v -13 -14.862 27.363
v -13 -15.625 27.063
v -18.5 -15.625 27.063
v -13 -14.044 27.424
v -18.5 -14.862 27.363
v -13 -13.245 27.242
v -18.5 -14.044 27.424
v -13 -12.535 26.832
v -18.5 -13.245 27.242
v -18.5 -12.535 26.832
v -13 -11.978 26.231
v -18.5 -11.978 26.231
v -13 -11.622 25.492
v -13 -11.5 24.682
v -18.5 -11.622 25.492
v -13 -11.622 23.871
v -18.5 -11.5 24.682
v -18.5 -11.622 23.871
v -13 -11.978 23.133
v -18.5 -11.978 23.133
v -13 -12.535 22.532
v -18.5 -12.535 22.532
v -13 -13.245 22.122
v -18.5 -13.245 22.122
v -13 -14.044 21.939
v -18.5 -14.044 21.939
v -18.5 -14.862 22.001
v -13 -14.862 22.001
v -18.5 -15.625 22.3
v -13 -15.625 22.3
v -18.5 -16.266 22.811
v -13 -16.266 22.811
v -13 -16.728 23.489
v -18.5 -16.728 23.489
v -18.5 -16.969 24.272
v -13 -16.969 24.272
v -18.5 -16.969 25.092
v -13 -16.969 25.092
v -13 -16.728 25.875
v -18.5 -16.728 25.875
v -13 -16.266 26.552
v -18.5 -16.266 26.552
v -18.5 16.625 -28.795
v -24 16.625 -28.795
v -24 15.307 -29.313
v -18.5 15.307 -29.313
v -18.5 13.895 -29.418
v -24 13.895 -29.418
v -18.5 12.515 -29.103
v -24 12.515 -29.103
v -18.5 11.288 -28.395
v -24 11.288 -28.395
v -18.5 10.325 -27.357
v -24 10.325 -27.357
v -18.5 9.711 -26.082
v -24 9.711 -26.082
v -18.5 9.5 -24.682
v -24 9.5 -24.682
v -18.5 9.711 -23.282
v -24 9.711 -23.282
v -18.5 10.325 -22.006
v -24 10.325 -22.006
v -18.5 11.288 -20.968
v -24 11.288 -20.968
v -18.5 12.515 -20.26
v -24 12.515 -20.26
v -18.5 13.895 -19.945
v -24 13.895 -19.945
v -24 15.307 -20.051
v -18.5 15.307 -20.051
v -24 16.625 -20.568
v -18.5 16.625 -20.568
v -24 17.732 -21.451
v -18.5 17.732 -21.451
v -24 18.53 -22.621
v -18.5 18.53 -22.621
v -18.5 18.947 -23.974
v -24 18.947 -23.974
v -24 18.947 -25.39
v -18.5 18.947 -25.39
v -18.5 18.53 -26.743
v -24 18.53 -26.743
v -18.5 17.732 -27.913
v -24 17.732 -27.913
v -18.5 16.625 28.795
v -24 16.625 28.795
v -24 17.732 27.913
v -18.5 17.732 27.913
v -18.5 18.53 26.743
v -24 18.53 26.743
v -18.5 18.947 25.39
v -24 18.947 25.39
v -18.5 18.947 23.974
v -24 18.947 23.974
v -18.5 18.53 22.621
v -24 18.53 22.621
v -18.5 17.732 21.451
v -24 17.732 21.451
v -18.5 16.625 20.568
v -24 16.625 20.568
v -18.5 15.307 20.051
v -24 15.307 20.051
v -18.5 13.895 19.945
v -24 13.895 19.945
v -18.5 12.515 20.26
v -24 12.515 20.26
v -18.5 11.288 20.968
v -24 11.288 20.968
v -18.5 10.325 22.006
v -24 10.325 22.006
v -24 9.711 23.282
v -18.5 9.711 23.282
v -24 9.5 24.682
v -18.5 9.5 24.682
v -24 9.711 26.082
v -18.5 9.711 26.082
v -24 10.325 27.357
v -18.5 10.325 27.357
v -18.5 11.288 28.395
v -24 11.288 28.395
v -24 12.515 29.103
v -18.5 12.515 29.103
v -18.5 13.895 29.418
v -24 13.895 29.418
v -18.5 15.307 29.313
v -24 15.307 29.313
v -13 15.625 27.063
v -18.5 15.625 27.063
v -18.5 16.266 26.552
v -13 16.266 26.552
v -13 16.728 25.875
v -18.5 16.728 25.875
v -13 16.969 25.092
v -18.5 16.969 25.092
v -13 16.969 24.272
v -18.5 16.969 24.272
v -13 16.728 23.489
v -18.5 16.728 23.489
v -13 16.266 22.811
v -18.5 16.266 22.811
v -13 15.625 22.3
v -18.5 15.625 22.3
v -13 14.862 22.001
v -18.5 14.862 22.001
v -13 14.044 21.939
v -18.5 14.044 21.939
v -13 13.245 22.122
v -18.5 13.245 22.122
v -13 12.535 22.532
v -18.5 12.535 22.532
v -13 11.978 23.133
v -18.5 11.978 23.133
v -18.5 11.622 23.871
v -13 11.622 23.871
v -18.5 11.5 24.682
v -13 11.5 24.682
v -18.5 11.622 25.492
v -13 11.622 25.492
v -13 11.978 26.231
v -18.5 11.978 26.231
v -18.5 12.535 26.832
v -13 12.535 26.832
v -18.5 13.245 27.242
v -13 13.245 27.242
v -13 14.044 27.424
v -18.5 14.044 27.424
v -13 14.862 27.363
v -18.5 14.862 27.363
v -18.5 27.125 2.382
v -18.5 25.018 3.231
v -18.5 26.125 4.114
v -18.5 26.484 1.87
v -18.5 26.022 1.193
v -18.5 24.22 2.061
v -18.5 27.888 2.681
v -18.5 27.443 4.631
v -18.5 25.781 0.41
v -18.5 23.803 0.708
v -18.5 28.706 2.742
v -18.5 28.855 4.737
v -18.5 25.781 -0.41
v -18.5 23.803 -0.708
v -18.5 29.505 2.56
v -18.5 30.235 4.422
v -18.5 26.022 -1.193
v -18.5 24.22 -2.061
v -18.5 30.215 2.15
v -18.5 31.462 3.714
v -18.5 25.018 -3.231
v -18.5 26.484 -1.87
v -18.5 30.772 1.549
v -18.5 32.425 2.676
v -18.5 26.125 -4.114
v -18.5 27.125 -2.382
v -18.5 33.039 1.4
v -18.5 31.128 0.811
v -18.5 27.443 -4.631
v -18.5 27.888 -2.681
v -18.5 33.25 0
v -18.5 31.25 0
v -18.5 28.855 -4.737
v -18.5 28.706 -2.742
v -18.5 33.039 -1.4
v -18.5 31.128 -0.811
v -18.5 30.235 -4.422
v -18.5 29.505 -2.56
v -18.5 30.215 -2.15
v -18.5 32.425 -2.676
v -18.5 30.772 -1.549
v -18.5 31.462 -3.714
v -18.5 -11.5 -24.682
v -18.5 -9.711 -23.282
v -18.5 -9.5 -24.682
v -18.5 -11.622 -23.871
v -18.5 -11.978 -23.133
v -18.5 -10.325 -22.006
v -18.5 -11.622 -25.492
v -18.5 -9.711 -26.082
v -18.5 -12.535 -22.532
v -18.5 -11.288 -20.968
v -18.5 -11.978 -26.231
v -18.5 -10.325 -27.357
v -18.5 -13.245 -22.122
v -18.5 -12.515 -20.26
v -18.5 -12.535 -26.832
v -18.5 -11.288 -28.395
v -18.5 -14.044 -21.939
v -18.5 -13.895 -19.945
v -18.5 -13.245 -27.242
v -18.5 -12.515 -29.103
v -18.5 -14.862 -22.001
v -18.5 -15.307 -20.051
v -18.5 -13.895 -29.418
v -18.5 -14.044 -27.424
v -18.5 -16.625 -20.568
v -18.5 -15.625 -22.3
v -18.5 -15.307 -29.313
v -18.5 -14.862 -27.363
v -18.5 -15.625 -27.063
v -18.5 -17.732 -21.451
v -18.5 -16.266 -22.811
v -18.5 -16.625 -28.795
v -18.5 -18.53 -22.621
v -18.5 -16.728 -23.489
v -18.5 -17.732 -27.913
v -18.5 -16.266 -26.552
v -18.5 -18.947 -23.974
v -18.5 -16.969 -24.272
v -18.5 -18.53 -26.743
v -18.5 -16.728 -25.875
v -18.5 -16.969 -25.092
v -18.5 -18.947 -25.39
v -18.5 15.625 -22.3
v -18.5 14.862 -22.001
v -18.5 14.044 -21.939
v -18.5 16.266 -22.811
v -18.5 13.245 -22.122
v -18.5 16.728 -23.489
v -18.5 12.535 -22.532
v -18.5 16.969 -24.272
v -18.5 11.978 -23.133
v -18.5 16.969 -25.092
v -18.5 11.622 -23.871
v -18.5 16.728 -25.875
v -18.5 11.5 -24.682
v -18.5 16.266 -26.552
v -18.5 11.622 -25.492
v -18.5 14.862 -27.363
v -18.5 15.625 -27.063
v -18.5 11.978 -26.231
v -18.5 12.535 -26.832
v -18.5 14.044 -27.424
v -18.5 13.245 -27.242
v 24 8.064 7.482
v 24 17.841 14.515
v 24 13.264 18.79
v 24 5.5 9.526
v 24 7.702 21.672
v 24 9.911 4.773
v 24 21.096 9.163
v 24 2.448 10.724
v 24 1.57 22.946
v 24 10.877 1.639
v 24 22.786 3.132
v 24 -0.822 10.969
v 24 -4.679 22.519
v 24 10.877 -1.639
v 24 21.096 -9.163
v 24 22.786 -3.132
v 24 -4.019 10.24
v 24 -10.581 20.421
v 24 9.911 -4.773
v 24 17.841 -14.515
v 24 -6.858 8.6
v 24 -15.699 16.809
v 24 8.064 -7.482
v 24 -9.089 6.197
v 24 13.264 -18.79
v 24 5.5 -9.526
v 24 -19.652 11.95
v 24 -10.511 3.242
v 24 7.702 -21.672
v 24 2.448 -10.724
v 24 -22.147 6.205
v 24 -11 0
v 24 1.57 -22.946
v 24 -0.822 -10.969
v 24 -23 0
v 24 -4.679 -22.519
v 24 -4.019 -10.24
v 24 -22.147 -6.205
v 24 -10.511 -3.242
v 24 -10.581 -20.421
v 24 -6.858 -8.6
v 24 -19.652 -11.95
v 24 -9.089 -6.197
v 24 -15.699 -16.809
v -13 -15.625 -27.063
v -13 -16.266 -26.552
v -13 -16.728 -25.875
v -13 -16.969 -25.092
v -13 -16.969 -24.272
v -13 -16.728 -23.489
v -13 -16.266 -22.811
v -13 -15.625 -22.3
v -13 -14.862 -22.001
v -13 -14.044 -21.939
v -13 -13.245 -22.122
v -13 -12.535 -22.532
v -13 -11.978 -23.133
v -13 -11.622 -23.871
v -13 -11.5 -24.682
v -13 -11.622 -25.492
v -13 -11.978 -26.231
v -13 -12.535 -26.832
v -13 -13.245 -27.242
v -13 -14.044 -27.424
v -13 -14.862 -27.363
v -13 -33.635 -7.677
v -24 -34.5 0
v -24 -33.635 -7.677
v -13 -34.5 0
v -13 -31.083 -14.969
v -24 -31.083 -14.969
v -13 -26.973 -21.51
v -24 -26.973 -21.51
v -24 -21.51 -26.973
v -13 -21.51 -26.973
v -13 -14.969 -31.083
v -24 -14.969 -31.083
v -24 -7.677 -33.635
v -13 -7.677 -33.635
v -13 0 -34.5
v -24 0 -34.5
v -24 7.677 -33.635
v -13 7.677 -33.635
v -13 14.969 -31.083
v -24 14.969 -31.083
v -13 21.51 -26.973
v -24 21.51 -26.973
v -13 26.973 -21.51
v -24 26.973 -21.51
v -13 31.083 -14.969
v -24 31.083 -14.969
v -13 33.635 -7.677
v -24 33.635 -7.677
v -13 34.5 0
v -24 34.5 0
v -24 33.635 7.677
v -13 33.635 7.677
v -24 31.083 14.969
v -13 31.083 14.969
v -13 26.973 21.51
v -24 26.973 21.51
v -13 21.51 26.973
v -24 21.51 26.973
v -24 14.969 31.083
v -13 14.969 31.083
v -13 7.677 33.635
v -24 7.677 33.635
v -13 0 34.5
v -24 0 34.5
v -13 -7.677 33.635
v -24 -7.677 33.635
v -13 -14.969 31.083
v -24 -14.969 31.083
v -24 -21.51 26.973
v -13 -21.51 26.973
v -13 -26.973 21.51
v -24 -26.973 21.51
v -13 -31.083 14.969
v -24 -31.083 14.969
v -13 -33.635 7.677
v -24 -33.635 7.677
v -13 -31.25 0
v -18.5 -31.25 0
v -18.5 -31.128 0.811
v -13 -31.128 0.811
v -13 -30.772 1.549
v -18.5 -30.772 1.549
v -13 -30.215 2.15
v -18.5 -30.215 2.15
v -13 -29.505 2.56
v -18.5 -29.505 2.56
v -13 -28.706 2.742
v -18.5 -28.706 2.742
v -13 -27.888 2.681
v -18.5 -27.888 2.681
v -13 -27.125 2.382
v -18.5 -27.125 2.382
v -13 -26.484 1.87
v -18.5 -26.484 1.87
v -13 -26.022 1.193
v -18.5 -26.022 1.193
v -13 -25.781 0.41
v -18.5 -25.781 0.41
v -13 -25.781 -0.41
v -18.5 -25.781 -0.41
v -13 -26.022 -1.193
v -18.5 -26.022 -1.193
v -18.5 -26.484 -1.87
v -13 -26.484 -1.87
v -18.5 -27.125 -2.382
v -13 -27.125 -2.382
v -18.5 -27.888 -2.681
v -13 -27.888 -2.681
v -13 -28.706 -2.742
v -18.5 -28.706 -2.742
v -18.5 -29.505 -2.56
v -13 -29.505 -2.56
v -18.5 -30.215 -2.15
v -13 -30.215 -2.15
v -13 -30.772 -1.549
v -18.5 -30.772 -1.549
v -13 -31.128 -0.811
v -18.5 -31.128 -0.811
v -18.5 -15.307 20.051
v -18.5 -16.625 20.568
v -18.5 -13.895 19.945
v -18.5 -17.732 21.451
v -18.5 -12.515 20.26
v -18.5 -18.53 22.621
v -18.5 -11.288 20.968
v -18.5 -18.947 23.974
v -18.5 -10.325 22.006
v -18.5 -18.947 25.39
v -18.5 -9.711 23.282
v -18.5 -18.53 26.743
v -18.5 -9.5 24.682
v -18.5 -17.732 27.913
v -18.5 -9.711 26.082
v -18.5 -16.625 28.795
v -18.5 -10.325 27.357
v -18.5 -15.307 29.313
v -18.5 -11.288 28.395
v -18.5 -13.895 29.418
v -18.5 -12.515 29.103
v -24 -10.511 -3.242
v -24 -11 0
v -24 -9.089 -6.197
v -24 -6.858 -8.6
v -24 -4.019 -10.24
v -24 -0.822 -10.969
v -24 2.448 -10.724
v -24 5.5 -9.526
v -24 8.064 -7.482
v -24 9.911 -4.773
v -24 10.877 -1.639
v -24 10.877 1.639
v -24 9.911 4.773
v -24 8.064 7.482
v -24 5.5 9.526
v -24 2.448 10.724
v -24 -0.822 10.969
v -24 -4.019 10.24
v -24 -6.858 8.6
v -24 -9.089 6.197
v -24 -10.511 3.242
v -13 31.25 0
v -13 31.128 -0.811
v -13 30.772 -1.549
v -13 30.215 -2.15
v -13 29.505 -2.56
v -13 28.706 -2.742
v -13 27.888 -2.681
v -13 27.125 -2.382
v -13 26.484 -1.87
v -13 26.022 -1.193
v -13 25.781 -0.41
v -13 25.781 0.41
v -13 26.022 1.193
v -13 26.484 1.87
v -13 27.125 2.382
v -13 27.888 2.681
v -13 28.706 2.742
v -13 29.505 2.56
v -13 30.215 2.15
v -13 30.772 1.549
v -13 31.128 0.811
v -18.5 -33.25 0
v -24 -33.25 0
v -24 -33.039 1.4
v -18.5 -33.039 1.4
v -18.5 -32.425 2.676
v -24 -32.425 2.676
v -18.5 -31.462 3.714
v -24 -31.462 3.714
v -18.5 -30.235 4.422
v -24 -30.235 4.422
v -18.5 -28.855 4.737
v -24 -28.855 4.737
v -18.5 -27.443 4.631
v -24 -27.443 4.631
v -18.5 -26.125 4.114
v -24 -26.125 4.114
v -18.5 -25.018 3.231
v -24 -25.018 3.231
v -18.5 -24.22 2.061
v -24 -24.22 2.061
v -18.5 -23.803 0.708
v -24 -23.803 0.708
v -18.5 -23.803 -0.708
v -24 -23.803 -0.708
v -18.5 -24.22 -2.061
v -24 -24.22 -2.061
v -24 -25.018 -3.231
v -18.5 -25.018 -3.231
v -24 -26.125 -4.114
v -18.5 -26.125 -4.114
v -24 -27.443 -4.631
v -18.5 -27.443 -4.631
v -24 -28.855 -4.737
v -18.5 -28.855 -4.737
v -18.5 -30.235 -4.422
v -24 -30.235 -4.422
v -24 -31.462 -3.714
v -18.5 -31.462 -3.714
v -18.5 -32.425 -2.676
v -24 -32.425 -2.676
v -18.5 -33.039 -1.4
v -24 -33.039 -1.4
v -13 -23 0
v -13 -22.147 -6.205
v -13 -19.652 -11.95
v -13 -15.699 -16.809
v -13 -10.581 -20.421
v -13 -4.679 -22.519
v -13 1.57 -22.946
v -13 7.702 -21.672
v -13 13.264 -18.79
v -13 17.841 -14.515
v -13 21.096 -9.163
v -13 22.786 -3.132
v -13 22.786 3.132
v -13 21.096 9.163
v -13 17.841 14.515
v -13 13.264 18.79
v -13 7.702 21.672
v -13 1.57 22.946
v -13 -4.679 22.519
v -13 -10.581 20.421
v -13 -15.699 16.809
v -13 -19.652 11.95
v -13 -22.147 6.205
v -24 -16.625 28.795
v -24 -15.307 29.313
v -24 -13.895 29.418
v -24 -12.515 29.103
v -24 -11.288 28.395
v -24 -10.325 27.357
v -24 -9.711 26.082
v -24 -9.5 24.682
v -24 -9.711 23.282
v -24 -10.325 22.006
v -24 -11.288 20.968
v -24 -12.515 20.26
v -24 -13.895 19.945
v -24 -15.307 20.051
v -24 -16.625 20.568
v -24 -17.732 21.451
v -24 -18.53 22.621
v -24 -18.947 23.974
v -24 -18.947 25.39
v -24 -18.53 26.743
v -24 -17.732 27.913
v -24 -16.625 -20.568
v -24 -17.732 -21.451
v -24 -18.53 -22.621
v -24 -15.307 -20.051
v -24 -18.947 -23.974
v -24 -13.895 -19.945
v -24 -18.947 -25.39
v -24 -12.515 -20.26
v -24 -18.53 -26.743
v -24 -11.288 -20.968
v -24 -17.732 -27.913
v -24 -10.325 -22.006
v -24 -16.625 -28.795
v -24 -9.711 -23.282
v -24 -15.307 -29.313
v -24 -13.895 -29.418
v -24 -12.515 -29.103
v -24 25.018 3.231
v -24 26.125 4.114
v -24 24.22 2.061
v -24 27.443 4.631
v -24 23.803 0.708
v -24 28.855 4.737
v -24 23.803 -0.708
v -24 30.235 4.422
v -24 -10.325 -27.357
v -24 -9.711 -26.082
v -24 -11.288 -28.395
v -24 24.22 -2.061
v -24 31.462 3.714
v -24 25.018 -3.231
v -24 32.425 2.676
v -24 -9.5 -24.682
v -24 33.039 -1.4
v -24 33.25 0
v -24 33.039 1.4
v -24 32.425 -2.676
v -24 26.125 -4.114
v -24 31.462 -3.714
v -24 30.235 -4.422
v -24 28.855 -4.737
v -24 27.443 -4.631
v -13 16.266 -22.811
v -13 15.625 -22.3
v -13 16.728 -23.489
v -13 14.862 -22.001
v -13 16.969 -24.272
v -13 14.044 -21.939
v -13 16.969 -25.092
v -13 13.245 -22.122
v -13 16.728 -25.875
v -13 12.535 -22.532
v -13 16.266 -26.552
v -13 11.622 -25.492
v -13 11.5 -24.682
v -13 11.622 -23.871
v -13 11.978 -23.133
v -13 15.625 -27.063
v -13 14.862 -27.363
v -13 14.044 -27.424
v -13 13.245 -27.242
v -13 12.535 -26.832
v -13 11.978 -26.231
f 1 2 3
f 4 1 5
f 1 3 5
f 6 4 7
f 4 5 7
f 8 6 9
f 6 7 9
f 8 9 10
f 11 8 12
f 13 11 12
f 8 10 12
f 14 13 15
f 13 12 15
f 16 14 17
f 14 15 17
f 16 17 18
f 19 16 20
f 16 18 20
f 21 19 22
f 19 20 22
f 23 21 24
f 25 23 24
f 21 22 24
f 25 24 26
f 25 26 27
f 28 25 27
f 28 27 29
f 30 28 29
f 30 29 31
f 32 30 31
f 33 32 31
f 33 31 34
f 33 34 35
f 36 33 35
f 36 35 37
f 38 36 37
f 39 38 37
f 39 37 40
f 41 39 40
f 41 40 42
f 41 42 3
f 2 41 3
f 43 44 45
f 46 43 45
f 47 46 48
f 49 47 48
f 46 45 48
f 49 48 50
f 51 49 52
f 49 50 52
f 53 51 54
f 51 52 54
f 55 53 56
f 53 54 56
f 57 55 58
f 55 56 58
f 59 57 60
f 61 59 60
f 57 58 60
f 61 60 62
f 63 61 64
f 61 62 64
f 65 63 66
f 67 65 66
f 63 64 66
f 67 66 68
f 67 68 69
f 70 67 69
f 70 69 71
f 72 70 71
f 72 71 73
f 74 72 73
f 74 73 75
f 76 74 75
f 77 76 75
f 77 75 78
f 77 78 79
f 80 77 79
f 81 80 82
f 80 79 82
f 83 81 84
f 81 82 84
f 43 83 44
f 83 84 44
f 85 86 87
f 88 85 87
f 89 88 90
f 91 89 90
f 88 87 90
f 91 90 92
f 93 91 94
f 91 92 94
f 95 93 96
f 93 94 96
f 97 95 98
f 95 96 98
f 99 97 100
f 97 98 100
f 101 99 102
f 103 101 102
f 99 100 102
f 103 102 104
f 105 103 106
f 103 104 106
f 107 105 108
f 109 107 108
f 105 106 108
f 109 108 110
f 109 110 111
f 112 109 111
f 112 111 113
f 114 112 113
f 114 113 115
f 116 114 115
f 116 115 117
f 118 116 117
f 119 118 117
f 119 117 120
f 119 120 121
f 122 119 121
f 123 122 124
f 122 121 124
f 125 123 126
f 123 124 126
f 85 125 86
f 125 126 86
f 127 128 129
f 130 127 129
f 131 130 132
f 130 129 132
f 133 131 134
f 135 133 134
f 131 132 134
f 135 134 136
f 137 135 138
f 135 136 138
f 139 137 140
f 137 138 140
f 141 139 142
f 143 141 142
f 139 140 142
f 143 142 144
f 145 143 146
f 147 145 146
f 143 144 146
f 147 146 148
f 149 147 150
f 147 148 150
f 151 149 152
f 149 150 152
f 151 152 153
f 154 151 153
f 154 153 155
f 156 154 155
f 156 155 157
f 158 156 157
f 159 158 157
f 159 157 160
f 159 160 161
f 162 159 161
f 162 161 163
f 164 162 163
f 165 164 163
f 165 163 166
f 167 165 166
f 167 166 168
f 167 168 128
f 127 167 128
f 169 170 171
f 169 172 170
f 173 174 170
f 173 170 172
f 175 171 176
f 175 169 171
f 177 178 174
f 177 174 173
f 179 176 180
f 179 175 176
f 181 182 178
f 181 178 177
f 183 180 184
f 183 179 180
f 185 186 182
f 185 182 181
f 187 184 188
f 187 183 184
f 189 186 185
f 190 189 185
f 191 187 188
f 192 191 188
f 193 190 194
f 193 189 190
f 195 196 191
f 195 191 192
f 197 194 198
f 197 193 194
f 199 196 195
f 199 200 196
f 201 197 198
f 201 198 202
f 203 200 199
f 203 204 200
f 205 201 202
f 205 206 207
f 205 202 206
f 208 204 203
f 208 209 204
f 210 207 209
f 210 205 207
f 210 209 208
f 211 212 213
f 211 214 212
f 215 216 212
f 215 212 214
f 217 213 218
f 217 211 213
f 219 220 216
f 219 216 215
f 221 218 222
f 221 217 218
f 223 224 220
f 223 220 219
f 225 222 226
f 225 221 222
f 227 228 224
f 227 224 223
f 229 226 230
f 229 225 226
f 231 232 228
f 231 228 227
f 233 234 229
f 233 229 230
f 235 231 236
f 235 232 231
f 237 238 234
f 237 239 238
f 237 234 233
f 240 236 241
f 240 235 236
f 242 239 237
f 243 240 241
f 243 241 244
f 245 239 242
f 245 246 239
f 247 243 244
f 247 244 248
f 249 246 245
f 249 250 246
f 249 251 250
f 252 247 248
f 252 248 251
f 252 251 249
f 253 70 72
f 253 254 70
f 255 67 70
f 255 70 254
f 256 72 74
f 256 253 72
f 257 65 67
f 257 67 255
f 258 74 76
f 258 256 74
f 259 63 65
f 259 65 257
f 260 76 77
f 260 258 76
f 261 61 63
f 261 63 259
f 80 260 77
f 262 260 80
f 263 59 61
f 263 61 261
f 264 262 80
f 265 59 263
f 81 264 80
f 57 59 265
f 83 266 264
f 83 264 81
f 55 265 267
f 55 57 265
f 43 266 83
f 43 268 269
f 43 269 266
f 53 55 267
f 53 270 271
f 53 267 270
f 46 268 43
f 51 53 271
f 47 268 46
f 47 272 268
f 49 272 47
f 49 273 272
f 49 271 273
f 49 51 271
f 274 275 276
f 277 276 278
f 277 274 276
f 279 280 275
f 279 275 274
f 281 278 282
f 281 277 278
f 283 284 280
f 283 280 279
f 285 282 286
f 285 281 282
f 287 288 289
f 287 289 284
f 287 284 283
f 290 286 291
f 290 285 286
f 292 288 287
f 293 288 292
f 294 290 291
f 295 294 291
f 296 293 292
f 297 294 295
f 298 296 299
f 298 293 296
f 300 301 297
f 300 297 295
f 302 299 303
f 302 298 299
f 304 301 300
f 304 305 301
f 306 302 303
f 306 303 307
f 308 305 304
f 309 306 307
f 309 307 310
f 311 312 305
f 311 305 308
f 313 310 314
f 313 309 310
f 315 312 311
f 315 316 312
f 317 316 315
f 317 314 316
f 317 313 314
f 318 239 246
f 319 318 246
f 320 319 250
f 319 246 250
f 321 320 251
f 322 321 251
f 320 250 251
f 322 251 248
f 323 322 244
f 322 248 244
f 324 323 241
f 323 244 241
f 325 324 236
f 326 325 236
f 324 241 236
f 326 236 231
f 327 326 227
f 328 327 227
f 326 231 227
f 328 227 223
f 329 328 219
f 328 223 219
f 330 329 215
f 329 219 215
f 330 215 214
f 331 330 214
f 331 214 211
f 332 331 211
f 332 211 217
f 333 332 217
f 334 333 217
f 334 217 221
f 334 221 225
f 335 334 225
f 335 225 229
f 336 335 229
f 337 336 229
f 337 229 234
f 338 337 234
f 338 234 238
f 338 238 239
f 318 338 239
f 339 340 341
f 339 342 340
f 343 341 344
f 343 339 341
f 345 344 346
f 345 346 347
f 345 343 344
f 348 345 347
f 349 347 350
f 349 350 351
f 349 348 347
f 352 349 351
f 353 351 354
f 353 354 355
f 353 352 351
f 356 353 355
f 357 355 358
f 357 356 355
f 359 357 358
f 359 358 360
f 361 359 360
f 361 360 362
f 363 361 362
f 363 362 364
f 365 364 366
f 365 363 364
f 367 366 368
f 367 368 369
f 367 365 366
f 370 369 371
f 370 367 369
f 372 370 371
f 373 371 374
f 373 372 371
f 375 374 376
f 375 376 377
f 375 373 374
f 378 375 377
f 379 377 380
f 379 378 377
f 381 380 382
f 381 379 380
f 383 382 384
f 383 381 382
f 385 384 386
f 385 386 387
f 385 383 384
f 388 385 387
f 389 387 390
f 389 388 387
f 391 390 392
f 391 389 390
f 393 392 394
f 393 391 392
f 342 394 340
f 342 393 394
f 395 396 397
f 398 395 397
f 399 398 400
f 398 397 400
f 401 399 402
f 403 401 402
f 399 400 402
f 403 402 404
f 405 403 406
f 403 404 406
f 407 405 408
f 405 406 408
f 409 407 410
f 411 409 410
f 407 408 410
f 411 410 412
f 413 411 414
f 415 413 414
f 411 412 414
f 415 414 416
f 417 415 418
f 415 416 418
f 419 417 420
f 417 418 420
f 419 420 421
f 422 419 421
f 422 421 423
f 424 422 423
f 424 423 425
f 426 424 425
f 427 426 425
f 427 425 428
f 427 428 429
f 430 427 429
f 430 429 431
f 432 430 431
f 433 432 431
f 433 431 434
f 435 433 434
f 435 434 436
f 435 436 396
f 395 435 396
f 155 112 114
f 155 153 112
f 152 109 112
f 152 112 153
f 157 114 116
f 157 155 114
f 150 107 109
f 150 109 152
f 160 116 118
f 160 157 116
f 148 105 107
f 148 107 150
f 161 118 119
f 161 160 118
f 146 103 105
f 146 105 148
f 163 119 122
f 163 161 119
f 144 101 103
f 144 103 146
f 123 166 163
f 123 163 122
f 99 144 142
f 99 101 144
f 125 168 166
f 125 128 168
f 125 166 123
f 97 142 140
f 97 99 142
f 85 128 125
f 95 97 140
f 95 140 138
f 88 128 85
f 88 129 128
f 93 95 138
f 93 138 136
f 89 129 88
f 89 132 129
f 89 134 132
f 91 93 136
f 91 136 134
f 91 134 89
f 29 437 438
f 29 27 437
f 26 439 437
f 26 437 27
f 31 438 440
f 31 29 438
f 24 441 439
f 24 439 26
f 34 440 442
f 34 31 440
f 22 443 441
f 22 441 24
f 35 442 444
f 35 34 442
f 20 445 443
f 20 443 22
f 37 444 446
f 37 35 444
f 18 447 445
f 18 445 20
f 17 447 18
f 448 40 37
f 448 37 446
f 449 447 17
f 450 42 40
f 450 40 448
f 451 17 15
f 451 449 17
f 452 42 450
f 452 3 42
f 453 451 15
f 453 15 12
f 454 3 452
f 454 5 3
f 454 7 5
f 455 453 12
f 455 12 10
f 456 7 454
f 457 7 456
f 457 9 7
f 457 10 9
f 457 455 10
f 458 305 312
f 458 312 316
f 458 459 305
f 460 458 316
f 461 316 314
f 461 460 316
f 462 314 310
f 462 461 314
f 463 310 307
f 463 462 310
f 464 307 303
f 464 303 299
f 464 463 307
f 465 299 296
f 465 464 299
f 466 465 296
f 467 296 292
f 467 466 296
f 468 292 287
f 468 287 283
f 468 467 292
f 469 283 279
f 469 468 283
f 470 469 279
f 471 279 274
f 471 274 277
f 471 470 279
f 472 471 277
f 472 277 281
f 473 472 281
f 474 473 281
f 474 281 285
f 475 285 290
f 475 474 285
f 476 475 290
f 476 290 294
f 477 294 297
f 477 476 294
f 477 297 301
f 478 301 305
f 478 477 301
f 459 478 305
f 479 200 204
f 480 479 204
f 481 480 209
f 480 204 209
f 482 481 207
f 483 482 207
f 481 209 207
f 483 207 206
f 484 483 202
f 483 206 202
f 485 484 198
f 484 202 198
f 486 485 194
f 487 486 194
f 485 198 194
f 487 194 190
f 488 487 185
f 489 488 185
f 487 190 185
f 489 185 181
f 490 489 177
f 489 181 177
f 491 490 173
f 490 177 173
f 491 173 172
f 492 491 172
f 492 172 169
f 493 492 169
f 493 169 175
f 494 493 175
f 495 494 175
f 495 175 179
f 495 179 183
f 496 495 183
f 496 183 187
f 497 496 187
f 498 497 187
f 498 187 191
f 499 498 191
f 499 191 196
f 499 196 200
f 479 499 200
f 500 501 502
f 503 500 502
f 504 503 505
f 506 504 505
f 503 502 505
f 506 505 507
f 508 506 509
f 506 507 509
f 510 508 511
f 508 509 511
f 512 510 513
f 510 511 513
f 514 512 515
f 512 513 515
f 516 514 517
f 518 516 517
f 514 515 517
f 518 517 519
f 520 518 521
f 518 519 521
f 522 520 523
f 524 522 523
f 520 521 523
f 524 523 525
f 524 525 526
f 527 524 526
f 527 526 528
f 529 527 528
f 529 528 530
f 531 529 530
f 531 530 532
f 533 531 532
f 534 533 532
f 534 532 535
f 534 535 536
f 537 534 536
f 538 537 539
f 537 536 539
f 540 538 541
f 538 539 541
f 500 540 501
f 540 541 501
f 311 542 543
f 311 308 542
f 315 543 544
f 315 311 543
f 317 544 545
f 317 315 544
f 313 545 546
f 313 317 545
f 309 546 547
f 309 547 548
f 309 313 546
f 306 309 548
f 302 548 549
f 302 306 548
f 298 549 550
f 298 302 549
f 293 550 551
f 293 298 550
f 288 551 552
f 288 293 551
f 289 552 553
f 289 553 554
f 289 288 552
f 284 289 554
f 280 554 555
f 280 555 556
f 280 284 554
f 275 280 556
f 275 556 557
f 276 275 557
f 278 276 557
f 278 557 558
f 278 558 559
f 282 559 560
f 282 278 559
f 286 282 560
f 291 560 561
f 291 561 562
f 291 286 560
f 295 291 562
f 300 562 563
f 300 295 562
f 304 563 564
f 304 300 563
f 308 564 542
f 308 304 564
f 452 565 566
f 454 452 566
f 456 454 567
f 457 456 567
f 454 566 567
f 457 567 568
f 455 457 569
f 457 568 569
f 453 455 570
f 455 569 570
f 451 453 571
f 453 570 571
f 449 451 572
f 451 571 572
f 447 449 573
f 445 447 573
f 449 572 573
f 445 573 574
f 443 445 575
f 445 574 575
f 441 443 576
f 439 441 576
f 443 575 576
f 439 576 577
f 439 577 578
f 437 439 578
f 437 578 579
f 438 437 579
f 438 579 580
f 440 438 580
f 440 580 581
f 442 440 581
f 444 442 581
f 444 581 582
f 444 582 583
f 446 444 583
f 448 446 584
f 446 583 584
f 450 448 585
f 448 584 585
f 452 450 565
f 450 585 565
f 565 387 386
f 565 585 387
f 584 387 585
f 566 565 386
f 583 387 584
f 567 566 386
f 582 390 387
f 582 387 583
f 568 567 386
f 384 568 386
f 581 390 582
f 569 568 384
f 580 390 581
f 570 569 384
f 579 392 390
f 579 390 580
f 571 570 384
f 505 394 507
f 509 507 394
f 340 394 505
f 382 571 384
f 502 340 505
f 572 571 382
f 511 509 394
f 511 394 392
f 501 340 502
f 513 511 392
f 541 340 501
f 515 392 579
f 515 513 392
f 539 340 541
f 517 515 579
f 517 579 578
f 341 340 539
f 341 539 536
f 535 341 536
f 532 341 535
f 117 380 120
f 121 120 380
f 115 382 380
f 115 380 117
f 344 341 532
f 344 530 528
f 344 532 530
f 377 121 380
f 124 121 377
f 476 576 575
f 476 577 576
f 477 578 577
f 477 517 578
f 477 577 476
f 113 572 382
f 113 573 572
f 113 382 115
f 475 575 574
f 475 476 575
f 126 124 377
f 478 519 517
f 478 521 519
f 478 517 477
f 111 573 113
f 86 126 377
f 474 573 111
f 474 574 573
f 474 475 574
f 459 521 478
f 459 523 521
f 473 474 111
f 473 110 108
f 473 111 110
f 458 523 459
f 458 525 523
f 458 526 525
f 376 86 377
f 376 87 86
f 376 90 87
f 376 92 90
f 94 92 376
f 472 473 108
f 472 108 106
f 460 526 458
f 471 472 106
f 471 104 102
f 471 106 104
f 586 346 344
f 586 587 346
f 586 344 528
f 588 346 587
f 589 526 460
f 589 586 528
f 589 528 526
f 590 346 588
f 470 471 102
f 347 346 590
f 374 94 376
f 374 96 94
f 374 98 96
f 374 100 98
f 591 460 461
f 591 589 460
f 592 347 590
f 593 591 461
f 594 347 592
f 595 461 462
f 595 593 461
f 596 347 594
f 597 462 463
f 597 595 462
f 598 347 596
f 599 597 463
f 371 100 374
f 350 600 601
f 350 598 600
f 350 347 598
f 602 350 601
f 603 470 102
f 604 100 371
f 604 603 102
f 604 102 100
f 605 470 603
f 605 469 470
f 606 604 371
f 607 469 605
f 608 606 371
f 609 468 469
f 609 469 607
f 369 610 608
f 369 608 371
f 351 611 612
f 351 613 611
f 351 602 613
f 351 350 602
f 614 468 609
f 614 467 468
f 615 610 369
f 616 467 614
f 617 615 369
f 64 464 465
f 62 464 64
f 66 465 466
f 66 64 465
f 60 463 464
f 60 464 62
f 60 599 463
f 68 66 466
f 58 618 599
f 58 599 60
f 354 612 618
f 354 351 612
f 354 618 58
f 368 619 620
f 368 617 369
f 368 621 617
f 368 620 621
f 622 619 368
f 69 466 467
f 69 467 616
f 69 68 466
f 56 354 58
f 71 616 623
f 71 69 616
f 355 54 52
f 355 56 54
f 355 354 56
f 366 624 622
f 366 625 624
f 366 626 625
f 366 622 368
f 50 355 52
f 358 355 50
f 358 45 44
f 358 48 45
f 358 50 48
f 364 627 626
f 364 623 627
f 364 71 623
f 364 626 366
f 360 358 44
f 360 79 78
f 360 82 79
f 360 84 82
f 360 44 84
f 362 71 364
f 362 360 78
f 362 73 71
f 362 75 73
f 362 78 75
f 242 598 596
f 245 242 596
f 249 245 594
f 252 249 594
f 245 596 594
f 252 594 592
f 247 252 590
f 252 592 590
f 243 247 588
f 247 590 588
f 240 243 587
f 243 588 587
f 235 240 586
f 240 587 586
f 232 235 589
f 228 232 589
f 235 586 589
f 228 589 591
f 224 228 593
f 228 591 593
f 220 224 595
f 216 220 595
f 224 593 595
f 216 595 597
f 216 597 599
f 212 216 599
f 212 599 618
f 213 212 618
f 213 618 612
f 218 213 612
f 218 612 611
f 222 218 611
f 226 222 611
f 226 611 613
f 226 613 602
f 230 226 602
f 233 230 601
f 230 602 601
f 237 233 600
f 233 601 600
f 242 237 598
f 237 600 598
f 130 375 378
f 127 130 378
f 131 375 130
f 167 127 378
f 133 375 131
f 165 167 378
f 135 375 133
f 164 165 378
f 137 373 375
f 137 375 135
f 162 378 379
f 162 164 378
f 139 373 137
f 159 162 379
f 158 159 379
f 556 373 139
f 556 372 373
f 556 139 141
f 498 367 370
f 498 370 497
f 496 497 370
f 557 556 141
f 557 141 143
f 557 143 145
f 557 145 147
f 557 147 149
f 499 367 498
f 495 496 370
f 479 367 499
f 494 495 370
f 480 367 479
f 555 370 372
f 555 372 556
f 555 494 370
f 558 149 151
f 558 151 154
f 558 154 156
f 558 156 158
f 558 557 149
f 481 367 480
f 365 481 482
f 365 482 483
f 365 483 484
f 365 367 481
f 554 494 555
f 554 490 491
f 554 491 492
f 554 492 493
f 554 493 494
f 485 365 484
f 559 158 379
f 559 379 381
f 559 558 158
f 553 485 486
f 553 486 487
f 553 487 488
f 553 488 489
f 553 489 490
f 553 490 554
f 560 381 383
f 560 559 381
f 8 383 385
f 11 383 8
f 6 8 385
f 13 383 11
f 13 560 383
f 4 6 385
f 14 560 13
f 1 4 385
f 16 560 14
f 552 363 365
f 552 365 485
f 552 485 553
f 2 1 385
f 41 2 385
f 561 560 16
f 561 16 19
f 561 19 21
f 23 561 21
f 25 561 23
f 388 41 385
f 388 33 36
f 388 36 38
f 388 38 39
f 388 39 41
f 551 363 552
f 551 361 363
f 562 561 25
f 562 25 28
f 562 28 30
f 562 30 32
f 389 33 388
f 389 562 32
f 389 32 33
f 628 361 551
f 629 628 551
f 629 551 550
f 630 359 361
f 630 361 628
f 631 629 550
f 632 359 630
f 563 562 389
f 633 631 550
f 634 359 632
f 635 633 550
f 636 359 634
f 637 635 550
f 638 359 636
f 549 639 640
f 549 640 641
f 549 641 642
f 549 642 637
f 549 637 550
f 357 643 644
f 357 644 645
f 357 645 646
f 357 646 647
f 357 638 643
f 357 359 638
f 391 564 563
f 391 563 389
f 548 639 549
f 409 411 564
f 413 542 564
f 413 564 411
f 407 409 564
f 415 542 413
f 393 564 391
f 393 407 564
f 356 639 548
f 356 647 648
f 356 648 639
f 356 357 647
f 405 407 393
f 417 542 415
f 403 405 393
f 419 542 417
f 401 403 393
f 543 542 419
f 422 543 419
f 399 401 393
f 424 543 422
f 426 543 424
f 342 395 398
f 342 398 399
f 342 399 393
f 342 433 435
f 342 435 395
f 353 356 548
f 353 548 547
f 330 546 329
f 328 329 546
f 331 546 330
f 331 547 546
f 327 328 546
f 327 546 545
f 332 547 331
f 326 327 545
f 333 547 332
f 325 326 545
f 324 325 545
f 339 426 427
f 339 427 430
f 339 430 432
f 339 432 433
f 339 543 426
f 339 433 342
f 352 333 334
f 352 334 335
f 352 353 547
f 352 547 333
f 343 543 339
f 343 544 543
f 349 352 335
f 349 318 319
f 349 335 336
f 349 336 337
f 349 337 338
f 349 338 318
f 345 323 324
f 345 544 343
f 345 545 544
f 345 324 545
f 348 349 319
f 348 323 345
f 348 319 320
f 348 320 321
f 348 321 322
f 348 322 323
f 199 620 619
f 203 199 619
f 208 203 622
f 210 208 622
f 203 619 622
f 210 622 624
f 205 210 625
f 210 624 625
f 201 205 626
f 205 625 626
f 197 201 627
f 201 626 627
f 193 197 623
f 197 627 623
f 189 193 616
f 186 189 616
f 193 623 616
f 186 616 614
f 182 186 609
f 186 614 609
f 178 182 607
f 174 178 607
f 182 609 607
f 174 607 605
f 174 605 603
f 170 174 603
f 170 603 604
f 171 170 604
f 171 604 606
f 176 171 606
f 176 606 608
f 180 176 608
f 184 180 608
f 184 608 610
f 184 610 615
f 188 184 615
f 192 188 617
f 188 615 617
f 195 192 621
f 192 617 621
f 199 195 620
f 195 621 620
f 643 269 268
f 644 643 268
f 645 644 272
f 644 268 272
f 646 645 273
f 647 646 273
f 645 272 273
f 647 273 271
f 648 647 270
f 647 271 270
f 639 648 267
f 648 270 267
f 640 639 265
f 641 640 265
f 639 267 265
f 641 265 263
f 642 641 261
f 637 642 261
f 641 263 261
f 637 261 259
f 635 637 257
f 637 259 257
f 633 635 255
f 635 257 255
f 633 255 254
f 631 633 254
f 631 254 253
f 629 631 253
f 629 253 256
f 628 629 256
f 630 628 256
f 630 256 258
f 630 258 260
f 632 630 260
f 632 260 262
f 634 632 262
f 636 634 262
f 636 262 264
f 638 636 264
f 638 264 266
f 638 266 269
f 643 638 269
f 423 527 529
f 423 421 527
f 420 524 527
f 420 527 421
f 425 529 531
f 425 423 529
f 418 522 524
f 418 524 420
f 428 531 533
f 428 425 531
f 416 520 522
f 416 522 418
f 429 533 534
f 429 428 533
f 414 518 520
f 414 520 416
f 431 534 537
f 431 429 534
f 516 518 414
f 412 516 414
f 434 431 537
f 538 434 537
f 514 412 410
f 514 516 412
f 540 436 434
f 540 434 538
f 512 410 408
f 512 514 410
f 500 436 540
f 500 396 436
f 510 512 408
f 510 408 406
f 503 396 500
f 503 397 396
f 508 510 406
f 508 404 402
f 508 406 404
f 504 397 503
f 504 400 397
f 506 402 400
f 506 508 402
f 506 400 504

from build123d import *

# Parameters (mm, degrees)
CUT_EXTRUDE1_REACH = 70.443
SKETCH2_R          = 2.75
SKETCH3_R          = 4.75
CUT_EXTRUDE2_DEPTH = 5.5
CIRPATTERN1_COUNT  = 6


with BuildPart() as part:
    # Sketch1 → Revolve1 (revolve)
    with BuildSketch(Plane.XY, mode=Mode.PRIVATE) as revolve1_sk:
        Polygon((-24, 34.5), (-13, 34.5), (-13, 23), (24, 23), (24, 11), (-24, 11), align=None)
    revolve(revolve1_sk.sketch.rotate(Axis((-82.106015927, 0, 0), (1, 0, 0)), 180), axis=Axis((-82.106015927, 0, 0), (1, 0, 0)))

    # Sketch2 → Cut-Extrude1 (cut, up to next)
    with BuildSketch(Plane.ZY.offset(24), mode=Mode.PRIVATE) as cut_extrude1_sk1:
        with Locations(Location((0, -28.5, 0), (0, 0, 270))):
            Circle(SKETCH2_R)
    cut_extrude1_tool1 = extrude(cut_extrude1_sk1.sketch, amount=-CUT_EXTRUDE1_REACH, mode=Mode.PRIVATE) & part.part
    cut_extrude1 = cut_extrude1_tool1.solids().sort_by_distance((-24, -28.5, 0))[0]
    add(cut_extrude1, mode=Mode.SUBTRACT)

    # Sketch3 → Cut-Extrude2 (cut)
    with BuildSketch(Plane.ZY.offset(24)):
        with Locations(Location((0, -28.5, 0), (0, 0, 270))):
            Circle(SKETCH3_R)
    cut_extrude2 = extrude(amount=-CUT_EXTRUDE2_DEPTH, mode=Mode.SUBTRACT)

    # CirPattern1: Cut-Extrude1, Cut-Extrude2 ×6 about axis
    cirpattern1_axis = Axis((0, 0, 0), (1, 0, 0))
    add([cut_extrude1.rotate(cirpattern1_axis, i * 360 / CIRPATTERN1_COUNT) for i in range(1, CIRPATTERN1_COUNT)], mode=Mode.SUBTRACT)
    add([cut_extrude2.rotate(cirpattern1_axis, i * 360 / CIRPATTERN1_COUNT) for i in range(1, CIRPATTERN1_COUNT)], mode=Mode.SUBTRACT)


solid = part.part
